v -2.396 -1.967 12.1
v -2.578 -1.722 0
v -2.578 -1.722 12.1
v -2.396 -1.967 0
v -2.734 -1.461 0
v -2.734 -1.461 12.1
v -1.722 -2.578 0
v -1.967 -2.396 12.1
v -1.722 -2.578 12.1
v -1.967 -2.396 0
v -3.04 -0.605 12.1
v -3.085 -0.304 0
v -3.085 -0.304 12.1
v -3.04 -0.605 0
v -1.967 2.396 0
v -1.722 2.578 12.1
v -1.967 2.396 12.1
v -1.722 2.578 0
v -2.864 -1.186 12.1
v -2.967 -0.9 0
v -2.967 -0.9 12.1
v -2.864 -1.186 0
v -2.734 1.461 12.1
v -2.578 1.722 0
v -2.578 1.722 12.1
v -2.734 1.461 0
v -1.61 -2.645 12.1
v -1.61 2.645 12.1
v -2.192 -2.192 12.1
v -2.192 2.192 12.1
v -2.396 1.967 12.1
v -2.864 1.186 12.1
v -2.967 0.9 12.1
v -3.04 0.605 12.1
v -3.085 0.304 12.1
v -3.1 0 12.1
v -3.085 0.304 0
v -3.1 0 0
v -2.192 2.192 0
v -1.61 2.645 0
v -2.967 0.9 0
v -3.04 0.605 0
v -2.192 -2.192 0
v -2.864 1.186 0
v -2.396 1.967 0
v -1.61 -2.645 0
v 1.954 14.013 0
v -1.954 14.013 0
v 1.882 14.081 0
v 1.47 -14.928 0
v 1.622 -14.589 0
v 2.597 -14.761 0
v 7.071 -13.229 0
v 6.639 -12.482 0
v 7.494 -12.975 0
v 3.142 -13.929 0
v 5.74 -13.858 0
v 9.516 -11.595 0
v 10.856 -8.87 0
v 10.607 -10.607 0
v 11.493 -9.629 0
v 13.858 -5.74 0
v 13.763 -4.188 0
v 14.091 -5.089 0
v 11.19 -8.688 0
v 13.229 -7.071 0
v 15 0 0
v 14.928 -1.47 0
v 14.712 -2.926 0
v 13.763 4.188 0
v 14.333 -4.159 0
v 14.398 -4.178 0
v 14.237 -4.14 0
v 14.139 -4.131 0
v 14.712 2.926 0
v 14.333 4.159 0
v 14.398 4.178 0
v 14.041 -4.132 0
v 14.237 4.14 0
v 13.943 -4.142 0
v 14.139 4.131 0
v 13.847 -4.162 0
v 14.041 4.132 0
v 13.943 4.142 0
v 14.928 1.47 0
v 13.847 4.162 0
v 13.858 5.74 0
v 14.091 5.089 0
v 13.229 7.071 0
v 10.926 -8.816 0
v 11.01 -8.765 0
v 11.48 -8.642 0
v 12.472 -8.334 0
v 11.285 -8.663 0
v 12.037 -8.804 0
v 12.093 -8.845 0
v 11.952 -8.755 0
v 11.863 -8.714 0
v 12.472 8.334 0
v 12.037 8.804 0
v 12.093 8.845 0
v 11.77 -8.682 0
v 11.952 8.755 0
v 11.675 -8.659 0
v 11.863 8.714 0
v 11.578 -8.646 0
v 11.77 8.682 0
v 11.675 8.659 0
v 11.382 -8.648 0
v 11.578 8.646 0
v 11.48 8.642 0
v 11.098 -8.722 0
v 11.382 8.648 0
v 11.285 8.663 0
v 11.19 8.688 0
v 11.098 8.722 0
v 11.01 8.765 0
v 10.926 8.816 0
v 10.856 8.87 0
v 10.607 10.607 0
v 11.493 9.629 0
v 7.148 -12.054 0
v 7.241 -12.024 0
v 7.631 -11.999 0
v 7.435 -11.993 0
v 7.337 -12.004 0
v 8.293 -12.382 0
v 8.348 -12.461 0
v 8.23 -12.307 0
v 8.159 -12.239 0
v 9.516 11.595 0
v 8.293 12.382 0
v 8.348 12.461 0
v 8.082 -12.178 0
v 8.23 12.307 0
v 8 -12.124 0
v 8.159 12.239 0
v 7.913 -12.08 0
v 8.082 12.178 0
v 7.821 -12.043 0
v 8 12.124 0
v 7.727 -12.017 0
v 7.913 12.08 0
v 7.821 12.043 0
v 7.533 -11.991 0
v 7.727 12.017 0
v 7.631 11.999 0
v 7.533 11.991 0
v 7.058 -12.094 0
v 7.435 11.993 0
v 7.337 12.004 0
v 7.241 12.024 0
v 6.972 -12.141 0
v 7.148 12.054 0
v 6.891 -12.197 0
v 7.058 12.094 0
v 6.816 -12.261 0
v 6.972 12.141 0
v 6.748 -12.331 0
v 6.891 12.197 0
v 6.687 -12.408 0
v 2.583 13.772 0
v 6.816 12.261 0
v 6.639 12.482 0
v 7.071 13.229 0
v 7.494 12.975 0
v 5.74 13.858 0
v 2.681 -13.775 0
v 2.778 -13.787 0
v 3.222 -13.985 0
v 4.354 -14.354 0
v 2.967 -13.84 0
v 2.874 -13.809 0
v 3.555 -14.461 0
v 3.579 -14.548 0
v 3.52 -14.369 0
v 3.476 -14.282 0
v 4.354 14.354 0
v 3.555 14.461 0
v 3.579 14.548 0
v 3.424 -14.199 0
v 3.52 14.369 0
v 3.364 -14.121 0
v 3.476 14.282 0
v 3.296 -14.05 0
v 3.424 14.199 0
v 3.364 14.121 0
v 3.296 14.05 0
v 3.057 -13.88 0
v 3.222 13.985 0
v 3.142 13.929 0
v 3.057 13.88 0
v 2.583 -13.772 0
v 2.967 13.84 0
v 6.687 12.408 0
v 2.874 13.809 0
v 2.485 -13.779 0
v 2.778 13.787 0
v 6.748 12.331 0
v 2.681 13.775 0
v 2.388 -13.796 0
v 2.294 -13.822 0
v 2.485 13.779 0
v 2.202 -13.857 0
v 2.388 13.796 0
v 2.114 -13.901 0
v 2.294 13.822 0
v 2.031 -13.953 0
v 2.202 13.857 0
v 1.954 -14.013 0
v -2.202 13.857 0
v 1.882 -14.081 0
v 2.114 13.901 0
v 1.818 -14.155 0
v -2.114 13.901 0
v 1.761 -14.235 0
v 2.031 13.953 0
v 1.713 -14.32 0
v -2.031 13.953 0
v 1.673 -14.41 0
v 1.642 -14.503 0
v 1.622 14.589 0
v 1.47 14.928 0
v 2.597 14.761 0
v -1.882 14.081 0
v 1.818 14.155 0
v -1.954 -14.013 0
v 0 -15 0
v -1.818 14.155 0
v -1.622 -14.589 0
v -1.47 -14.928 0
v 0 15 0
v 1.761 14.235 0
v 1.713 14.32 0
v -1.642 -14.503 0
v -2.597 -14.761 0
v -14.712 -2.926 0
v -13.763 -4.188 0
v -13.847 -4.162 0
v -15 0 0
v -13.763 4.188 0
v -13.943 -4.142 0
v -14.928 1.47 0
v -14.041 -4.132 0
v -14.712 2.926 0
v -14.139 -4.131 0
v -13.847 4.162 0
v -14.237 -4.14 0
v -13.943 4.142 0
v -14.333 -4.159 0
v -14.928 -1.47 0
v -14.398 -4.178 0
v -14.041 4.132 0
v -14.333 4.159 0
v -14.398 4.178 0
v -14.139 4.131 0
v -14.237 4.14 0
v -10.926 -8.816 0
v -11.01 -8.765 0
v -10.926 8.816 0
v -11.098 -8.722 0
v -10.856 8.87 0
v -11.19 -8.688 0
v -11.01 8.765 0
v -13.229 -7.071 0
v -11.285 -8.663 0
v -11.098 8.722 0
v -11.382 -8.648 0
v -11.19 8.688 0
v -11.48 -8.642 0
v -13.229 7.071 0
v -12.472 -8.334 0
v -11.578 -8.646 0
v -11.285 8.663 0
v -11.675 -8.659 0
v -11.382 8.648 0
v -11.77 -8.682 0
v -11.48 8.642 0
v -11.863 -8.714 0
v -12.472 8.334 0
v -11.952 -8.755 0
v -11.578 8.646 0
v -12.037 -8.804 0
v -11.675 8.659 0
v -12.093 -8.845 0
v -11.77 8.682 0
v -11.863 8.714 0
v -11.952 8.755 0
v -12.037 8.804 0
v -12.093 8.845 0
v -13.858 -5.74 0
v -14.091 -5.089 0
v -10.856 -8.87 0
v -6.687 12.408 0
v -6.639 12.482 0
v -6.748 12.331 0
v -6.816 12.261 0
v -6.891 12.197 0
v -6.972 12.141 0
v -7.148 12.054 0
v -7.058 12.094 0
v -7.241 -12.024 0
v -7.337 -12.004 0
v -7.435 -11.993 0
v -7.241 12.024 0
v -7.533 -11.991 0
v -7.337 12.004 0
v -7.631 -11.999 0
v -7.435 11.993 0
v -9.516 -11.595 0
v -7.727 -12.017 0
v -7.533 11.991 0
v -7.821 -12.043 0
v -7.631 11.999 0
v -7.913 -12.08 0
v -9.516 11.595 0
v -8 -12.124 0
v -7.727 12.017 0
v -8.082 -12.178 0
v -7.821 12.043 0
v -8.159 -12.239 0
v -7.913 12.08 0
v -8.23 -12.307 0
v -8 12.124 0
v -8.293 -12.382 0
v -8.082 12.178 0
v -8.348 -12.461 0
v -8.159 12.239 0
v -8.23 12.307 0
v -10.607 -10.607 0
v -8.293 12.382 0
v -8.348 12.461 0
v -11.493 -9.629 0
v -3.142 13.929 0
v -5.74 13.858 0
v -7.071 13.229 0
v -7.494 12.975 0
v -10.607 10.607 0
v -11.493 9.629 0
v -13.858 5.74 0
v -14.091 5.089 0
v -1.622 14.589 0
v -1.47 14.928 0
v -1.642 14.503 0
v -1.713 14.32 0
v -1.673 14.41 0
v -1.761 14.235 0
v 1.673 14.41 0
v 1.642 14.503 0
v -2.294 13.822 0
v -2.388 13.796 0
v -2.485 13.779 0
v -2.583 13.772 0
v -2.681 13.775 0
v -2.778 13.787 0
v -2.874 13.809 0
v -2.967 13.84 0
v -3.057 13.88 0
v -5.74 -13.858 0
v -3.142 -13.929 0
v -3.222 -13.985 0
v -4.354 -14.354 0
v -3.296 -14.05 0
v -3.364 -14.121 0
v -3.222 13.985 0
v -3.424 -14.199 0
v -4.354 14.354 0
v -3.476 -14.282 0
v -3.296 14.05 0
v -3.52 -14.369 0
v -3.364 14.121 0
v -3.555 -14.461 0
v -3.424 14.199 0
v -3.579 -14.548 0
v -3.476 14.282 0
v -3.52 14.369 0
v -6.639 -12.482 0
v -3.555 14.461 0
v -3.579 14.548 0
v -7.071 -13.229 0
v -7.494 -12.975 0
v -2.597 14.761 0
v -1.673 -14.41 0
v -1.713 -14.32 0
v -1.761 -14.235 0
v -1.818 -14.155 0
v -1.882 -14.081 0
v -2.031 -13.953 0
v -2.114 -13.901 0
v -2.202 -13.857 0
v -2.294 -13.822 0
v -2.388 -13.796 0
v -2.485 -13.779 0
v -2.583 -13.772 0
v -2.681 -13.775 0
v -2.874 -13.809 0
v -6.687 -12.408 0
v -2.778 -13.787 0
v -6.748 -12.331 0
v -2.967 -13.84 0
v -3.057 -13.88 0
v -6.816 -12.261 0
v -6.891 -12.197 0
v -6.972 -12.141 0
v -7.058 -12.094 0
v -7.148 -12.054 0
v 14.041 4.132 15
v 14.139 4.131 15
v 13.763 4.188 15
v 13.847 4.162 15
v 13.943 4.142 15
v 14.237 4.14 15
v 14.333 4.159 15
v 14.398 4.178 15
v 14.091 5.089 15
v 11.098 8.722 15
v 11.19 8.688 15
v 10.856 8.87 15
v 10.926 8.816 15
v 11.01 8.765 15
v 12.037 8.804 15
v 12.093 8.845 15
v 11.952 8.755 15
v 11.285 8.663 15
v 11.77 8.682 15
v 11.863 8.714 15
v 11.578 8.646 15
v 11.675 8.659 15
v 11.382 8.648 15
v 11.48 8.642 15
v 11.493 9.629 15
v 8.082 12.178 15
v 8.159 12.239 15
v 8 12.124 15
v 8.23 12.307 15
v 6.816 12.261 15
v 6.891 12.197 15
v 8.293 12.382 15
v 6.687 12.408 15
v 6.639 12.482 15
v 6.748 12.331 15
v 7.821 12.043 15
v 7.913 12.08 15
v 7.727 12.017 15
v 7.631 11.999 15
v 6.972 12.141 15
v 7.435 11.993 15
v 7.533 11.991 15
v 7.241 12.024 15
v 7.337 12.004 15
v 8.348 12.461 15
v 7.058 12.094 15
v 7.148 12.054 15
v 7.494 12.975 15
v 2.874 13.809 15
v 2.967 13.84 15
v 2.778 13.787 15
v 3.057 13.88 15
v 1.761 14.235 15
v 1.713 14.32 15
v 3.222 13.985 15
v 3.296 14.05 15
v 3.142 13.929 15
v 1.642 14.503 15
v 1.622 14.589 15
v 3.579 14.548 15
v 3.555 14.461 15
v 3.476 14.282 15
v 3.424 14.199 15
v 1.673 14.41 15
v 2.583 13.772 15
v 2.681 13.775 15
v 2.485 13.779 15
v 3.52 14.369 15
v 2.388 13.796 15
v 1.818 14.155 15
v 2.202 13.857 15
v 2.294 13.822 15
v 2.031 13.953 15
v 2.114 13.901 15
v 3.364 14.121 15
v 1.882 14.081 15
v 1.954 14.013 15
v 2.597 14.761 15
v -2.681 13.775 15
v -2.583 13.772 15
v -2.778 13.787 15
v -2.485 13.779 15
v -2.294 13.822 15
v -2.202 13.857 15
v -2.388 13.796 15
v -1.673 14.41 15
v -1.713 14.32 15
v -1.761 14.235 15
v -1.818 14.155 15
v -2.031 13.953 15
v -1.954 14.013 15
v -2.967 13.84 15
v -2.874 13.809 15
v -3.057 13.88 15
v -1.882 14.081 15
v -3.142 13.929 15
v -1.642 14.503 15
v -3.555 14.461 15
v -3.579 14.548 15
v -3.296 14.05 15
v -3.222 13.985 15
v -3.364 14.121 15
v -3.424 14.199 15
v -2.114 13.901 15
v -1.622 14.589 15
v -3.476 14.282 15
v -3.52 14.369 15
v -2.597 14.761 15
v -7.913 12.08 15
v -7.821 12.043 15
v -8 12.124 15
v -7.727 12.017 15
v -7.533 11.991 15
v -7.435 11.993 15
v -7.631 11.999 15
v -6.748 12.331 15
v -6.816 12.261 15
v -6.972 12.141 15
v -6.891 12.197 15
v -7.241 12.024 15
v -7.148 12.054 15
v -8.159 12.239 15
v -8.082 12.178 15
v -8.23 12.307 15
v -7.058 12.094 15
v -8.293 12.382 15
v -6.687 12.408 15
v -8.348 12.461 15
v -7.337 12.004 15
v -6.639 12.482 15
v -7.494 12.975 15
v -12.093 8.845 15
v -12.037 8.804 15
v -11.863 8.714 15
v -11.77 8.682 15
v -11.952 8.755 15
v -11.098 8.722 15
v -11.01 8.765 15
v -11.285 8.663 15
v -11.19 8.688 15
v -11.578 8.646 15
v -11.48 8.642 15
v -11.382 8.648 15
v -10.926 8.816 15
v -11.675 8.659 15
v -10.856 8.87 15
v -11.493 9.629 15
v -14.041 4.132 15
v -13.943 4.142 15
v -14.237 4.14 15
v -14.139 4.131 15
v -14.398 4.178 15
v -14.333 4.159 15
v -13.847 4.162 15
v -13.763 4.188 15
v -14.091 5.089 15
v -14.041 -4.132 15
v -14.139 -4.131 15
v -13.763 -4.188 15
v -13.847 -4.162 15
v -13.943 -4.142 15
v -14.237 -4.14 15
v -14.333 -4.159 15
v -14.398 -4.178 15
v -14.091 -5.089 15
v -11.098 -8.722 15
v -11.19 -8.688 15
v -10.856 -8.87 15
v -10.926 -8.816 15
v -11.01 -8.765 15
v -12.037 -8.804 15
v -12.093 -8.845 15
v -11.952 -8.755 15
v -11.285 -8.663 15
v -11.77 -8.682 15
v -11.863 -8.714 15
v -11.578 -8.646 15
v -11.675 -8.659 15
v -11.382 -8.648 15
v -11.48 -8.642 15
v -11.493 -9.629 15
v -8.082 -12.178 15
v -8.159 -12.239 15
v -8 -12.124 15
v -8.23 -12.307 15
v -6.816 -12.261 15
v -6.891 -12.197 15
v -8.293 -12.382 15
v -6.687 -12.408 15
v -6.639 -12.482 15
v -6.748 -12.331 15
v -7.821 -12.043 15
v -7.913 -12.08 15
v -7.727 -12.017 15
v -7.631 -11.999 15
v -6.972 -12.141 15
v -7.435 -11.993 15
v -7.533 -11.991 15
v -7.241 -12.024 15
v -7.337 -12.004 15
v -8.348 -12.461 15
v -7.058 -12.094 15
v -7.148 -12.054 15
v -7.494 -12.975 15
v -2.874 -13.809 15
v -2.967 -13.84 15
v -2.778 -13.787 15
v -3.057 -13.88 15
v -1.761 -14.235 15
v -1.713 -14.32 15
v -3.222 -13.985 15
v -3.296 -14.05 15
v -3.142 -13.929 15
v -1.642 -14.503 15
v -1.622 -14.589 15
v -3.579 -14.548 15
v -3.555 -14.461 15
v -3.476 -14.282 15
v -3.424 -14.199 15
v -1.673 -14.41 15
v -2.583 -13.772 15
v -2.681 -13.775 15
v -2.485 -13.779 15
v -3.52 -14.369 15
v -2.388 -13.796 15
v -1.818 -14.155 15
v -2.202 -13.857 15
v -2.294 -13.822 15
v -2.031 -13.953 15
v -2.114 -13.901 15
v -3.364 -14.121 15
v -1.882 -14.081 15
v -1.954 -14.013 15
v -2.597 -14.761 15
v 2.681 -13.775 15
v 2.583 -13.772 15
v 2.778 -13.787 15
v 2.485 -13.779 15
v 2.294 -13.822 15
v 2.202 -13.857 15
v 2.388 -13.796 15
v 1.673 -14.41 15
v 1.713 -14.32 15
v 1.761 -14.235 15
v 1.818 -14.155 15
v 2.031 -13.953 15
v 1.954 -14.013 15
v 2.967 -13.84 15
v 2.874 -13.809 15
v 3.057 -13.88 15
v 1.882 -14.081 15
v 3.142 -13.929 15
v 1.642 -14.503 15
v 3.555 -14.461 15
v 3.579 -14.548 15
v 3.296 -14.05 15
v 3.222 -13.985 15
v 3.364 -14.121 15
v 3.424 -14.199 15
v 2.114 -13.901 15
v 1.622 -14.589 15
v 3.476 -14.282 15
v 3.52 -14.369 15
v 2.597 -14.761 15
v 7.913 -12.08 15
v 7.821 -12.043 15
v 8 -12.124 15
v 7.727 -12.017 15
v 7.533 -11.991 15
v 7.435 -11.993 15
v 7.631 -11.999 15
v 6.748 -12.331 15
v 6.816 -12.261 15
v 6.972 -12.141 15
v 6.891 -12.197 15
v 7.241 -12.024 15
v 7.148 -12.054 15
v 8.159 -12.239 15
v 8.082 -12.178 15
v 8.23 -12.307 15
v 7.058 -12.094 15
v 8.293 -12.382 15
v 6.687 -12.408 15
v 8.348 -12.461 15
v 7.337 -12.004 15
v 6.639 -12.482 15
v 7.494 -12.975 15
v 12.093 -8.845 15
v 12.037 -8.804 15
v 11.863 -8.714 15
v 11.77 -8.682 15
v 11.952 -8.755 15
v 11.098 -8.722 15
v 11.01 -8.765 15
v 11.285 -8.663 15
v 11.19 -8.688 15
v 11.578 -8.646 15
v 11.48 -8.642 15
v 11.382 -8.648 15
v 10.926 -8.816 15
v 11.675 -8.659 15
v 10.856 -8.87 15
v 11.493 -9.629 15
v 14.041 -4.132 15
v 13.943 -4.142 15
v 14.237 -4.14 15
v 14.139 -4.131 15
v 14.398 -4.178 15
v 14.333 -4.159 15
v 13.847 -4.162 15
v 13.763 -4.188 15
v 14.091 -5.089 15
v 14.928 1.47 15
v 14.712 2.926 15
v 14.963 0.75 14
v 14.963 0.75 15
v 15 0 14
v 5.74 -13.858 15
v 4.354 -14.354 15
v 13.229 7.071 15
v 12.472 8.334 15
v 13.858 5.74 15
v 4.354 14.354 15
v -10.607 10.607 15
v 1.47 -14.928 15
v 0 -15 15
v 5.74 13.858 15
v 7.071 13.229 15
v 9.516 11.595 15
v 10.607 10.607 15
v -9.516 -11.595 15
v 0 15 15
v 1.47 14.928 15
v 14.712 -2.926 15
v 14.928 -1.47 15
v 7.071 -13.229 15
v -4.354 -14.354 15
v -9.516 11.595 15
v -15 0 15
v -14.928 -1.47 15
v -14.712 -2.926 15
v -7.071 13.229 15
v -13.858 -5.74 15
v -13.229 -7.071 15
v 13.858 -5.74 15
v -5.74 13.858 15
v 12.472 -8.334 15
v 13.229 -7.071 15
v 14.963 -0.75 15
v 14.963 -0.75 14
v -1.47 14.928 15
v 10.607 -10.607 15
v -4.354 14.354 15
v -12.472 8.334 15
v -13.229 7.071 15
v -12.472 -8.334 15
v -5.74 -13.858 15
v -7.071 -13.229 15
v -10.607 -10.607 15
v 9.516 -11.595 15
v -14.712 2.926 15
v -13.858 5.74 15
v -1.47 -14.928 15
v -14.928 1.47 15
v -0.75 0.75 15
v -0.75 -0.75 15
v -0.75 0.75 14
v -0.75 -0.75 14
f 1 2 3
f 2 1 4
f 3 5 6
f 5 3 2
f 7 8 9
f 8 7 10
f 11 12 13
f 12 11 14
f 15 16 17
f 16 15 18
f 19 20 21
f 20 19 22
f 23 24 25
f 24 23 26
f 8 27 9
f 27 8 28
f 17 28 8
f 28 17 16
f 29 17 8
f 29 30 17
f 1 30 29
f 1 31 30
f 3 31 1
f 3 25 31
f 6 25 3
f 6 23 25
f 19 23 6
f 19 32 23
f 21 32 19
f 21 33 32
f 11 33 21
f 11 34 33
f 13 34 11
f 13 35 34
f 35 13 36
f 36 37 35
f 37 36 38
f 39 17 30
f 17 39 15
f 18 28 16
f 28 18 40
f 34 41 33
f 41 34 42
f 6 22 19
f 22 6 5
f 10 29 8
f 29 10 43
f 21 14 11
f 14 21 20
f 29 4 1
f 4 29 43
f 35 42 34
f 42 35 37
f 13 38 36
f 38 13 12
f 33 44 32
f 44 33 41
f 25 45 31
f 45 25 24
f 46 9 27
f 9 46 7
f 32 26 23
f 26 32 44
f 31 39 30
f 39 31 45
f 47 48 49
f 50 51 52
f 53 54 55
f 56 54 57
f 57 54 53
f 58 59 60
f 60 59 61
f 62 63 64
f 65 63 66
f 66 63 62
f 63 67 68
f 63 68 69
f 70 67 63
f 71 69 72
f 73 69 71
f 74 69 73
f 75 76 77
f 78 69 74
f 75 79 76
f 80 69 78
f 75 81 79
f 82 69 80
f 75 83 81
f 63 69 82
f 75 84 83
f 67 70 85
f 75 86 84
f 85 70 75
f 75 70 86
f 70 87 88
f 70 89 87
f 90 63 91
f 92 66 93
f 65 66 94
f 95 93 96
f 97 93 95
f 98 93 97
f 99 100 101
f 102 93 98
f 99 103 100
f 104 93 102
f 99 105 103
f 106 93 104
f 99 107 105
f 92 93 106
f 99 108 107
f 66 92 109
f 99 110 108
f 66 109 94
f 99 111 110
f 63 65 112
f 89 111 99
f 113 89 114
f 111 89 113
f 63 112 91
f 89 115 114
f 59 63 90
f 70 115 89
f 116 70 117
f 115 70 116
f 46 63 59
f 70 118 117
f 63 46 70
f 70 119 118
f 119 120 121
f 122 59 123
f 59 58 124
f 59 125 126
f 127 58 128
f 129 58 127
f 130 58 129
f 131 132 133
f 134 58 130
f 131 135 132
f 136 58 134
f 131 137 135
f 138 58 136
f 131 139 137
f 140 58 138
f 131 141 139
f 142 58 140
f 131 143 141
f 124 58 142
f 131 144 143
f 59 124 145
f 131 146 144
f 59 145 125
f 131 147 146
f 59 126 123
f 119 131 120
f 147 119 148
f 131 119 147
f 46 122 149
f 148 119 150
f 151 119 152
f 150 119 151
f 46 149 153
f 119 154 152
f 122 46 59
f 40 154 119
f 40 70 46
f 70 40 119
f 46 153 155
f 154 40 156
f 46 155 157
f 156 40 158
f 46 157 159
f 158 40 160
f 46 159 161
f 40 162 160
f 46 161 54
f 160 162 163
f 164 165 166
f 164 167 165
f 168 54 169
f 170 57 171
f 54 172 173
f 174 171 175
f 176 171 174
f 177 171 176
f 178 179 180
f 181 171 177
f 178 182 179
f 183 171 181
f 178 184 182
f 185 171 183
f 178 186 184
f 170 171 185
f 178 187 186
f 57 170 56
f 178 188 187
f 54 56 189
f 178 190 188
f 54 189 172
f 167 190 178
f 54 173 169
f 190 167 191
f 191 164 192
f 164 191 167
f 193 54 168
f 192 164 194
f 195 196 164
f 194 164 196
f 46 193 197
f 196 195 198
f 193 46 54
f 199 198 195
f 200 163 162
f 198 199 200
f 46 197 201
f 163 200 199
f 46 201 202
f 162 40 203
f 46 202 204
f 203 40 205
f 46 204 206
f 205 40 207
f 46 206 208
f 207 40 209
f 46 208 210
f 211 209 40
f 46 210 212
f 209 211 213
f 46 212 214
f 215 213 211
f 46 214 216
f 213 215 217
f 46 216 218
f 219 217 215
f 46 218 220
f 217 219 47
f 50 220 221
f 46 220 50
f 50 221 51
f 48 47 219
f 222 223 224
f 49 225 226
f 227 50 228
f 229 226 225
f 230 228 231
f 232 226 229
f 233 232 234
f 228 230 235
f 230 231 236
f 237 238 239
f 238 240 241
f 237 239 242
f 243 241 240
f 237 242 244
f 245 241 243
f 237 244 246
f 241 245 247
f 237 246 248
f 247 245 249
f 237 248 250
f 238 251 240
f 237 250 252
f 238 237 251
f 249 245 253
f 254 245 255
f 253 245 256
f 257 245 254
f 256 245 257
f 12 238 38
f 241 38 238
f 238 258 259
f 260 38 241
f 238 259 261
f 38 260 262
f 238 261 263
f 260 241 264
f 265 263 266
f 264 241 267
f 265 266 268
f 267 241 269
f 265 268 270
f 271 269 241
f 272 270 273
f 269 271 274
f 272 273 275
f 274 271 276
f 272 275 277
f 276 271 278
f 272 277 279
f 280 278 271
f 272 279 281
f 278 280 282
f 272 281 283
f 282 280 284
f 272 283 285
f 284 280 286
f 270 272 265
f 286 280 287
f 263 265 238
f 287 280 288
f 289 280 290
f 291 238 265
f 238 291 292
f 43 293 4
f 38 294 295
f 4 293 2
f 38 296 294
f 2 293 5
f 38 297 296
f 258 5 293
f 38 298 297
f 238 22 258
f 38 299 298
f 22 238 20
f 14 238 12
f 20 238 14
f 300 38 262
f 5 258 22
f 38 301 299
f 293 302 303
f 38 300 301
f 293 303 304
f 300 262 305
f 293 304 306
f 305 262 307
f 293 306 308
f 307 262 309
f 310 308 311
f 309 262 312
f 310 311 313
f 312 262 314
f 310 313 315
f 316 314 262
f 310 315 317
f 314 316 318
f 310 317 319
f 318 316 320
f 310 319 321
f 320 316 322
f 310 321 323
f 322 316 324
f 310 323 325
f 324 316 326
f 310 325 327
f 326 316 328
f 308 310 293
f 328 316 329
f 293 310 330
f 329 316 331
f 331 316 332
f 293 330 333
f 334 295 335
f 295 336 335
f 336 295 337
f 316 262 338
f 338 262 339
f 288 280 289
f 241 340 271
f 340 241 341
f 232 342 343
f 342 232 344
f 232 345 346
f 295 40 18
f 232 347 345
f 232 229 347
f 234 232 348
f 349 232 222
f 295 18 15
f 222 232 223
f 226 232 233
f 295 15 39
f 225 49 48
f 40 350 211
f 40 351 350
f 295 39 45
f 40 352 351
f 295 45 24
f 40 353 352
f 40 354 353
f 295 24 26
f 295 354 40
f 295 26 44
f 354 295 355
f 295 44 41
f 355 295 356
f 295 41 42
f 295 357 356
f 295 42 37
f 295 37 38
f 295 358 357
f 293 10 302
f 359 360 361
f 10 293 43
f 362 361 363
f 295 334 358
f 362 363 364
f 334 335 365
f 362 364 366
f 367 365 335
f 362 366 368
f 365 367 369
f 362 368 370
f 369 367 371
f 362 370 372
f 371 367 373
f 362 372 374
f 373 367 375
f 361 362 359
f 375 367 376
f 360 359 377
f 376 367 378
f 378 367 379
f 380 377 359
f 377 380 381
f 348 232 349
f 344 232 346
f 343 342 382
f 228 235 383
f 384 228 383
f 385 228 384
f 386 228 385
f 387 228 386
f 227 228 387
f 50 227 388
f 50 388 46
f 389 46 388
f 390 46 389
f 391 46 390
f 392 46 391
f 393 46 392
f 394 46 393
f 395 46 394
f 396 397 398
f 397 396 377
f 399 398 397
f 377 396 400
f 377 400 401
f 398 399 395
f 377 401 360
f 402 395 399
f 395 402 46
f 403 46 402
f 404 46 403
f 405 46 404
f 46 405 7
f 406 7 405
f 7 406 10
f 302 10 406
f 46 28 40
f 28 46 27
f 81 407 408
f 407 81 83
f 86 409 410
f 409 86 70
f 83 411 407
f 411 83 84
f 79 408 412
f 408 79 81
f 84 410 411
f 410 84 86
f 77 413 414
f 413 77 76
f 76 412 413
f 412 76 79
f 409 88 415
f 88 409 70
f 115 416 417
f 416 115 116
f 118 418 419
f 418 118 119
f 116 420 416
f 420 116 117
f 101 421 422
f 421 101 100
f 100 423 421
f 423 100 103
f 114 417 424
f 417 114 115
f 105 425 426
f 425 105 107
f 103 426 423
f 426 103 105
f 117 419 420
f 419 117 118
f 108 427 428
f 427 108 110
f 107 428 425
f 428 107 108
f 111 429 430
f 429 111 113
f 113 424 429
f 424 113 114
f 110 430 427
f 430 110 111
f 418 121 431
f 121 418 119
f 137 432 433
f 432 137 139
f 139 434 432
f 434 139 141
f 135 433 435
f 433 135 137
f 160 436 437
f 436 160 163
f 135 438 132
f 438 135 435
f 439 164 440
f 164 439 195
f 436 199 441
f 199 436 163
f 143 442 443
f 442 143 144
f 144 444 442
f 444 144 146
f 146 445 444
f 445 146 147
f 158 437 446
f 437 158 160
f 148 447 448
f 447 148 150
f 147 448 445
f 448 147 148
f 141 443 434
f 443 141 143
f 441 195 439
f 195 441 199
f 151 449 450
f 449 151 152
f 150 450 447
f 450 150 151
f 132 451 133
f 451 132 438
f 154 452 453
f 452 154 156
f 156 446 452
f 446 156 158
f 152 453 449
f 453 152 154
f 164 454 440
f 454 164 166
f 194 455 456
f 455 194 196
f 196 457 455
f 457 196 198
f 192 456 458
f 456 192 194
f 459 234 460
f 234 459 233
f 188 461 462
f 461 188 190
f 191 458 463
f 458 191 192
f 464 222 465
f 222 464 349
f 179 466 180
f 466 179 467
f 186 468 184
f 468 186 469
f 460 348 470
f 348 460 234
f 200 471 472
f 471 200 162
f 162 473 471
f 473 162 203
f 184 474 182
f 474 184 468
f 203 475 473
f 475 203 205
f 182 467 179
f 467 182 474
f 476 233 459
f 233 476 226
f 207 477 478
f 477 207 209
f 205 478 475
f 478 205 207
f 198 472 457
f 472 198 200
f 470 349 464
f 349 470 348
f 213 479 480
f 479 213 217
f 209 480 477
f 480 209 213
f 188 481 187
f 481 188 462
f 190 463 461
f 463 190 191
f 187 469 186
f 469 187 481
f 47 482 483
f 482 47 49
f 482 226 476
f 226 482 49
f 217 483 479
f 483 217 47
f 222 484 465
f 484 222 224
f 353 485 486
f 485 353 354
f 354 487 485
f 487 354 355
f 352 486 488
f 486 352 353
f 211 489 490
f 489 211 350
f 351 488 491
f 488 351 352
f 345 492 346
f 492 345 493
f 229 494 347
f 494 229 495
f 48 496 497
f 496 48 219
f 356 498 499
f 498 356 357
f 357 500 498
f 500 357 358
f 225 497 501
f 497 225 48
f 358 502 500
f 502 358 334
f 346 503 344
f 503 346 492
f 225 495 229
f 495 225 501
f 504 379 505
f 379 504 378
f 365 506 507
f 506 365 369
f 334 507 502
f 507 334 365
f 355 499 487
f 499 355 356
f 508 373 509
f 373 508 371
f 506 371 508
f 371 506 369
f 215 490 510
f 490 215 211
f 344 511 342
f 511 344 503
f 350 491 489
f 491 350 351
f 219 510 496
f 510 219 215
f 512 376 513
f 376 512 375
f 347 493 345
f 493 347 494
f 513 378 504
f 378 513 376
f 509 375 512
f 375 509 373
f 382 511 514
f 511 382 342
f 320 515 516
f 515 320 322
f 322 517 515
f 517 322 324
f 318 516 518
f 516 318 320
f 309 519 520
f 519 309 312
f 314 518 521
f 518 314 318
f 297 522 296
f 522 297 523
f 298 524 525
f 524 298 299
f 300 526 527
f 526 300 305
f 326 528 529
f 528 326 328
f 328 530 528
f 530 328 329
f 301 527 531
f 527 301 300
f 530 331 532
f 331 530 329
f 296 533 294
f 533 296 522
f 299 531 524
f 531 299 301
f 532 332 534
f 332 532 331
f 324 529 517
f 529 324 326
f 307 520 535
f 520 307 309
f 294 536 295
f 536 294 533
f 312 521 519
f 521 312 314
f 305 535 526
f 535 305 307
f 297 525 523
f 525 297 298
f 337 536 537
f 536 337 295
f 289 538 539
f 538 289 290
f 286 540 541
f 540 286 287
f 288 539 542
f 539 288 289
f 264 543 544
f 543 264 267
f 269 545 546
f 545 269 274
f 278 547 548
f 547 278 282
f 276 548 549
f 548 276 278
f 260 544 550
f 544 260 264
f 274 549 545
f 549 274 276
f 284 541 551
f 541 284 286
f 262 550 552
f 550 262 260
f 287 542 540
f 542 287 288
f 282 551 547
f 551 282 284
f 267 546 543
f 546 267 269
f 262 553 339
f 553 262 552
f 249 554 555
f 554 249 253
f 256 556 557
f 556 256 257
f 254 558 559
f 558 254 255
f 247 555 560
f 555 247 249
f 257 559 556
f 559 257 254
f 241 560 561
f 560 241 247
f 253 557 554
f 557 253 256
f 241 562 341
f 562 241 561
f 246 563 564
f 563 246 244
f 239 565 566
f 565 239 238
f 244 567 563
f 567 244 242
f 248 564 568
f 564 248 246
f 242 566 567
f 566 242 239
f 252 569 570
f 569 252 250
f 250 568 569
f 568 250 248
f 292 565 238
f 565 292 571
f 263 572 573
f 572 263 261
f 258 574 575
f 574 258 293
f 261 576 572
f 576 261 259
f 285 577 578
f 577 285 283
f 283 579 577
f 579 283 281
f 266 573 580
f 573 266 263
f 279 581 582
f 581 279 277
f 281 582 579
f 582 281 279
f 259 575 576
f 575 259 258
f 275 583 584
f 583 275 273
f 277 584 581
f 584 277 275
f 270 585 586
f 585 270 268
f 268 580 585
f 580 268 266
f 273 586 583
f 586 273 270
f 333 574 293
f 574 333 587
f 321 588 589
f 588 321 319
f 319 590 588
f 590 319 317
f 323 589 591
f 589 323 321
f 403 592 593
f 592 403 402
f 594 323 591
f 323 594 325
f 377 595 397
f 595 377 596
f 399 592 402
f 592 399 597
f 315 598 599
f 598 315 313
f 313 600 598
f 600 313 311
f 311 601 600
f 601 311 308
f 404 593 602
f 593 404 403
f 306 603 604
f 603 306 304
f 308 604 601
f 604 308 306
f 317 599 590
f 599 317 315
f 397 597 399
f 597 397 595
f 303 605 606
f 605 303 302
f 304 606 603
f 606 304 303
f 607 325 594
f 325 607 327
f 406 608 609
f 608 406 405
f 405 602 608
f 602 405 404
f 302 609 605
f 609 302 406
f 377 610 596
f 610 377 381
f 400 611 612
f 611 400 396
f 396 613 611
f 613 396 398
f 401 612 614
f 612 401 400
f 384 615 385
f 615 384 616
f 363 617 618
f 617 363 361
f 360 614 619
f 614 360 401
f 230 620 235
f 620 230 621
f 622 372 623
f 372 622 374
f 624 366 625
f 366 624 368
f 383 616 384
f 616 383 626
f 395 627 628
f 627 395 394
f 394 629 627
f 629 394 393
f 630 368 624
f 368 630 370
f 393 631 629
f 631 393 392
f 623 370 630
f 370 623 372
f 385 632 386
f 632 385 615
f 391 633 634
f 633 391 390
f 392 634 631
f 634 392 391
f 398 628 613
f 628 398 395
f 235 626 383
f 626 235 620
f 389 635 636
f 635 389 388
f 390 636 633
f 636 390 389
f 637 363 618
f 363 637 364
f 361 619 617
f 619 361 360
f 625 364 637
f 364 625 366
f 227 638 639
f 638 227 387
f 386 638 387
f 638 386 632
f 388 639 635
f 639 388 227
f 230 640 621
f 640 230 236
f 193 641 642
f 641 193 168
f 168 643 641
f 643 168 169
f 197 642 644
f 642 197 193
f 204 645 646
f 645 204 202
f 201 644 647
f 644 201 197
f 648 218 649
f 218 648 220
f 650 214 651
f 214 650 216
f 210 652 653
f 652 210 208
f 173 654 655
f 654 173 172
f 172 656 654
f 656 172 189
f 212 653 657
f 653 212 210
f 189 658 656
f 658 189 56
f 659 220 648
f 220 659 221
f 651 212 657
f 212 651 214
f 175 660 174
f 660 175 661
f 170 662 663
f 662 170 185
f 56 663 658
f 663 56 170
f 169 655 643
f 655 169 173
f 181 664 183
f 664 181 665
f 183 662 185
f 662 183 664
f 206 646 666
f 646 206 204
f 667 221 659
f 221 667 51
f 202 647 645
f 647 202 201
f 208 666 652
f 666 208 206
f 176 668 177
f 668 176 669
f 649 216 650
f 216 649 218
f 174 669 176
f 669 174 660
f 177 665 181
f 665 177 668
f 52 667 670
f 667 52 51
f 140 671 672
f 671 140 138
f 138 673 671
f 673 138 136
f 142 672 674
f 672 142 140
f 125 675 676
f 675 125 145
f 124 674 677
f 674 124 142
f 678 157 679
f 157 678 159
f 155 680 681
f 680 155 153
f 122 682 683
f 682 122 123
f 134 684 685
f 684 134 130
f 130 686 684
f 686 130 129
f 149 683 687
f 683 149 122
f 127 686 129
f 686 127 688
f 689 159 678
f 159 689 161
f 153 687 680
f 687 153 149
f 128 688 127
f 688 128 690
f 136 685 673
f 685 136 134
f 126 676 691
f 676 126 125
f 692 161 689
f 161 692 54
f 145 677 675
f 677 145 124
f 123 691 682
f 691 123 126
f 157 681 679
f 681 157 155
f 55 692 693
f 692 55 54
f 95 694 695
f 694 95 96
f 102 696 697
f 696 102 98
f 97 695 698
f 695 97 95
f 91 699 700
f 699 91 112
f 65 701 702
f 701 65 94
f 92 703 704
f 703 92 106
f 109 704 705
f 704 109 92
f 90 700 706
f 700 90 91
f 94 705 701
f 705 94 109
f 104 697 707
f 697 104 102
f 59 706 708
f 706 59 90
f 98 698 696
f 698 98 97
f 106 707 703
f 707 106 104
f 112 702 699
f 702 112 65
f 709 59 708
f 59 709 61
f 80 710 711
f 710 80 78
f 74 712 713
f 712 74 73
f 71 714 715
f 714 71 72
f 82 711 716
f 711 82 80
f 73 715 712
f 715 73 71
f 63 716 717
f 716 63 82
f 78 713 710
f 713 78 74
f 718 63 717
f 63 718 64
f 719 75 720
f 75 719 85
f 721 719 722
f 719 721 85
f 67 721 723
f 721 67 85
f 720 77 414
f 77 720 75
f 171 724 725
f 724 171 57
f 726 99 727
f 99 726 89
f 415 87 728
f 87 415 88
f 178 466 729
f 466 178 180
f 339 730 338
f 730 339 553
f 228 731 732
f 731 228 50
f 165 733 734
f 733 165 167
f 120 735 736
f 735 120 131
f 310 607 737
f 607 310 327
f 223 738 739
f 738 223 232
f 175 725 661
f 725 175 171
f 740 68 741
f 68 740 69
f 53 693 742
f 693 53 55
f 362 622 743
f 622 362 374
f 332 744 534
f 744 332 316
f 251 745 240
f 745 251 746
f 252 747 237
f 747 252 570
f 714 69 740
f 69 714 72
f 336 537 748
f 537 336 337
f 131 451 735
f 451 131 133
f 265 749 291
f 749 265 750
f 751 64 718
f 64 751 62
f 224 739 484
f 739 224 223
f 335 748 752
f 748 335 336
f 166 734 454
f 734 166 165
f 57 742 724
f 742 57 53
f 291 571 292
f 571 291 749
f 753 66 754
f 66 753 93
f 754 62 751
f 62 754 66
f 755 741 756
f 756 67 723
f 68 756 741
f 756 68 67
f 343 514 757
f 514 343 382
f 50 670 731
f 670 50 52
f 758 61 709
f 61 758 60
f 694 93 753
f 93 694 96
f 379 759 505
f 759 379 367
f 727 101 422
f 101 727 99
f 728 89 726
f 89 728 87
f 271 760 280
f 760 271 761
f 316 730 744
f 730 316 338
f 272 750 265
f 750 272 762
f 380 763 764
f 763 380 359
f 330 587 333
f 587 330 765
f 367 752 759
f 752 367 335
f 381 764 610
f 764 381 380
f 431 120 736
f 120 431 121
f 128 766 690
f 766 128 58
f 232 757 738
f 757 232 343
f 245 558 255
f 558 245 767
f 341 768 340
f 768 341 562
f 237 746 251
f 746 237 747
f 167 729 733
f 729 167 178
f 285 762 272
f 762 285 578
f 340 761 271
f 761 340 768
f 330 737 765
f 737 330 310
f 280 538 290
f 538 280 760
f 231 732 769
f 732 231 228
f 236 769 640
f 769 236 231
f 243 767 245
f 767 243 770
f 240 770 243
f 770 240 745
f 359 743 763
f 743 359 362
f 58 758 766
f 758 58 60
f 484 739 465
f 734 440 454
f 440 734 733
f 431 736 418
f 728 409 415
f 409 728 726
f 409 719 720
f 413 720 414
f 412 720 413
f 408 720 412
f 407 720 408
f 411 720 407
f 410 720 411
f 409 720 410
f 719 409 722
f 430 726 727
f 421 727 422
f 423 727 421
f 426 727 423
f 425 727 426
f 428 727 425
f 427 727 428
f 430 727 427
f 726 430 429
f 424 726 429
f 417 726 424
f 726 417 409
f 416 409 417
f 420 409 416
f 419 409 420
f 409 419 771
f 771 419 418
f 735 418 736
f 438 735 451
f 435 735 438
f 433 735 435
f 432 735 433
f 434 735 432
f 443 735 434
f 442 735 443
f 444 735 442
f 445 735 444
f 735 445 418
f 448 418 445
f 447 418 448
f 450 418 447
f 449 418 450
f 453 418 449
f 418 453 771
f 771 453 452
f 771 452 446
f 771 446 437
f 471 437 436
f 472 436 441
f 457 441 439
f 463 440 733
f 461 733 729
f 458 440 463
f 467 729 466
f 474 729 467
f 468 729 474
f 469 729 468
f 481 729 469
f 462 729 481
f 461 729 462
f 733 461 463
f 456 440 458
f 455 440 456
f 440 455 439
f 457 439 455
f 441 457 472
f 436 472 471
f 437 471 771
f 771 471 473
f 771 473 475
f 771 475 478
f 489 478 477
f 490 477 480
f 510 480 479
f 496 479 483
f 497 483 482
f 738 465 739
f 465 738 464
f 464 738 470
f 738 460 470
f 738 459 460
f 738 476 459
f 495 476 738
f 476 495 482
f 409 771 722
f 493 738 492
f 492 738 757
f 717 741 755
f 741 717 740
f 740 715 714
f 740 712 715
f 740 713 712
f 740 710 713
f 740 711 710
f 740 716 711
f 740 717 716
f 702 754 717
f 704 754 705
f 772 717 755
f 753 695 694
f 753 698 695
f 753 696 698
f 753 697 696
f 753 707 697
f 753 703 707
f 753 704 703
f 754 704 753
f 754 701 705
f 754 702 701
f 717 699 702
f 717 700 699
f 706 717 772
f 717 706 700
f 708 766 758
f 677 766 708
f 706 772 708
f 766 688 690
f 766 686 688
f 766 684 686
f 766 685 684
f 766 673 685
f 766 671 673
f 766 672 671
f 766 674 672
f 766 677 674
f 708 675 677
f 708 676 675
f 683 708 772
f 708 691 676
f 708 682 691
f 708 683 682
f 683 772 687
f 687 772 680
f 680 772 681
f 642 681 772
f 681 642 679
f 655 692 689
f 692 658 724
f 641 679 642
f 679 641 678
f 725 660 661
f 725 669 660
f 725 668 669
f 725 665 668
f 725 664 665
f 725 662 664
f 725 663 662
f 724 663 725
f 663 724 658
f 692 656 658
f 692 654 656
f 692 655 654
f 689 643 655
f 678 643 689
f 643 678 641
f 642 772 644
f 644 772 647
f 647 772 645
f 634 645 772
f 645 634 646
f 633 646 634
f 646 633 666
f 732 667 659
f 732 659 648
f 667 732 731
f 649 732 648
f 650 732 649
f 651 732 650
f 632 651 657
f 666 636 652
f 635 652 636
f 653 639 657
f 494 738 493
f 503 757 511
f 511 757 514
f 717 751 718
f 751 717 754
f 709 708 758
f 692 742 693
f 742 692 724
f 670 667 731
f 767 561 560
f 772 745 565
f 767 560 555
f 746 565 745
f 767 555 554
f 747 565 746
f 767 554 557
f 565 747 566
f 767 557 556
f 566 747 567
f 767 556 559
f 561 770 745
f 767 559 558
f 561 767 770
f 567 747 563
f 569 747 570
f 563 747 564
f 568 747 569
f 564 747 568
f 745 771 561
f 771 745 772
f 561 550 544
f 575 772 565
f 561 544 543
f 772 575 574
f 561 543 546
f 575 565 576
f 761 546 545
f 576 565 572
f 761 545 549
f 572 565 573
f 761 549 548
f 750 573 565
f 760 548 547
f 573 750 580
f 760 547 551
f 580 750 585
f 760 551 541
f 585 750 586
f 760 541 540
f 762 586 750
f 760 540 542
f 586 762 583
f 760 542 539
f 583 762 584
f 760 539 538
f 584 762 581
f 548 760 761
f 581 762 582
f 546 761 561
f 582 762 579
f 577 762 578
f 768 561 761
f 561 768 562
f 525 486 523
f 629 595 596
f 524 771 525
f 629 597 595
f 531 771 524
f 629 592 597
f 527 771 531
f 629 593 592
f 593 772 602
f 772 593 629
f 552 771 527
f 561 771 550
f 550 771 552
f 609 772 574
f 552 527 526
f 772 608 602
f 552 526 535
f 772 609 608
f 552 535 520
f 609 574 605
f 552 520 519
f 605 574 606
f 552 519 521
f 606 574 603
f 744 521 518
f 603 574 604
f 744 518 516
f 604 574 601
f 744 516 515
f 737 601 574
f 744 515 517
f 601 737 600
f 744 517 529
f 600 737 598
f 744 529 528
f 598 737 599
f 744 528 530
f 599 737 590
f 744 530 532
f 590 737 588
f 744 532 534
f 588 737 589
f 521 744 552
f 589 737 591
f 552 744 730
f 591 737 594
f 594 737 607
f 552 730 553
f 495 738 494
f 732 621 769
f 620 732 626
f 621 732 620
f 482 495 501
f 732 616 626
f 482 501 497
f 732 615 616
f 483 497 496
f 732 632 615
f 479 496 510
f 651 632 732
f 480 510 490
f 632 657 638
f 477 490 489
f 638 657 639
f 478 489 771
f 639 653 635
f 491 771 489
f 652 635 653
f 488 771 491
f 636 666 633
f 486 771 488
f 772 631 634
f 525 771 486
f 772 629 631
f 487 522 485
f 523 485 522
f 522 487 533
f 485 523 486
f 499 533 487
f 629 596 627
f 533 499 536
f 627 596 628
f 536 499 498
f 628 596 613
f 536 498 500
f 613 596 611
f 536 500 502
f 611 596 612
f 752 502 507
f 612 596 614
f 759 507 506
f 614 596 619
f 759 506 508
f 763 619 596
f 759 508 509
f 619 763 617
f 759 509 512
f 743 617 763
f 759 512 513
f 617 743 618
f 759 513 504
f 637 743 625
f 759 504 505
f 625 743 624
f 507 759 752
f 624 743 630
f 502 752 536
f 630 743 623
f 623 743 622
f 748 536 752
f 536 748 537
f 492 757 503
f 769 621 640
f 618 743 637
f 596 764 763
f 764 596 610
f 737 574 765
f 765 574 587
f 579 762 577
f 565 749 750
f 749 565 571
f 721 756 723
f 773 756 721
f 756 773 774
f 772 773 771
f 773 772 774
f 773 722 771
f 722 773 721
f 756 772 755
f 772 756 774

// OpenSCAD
// Replacement knob for hotplate stirrer with 6 mm D-shaft
// Dimensions measured with calipers

// Knob body dimensions
knob_diameter = 30;
knob_radius = knob_diameter / 2;
knob_height = 15;

// D-shaft blind bore dimensions
bore_diameter = 6.2;
bore_radius = bore_diameter / 2;
bore_depth = 12;
// Distance from flat to opposite side of circle is 4.7 mm
// This means the flat is offset from center by: bore_radius - 4.7 = 3.1 - 4.7 = -1.6 mm
// So the flat is 1.6 mm on the opposite side of center from the "point" of the D
d_flat_offset = bore_radius - 4.7; // = -1.6 mm

// Grip groove dimensions
num_grooves = 18;
groove_diameter = 2;
groove_radius = groove_diameter / 2;

// Pointer groove dimensions
pointer_width = 1.5;
pointer_depth = 1;

// Print quality
$fn = 64;

// Main knob body
difference() {
    // Solid cylinder
    cylinder(h = knob_height, r = knob_radius, center = false);
    
    // D-shaped blind bore (centered on Z axis, extending from z=0 up to bore_depth)
    // The D-shape: a circle with one side cut flat
    // The flat is at distance d_flat_offset from center (negative means flat is on the -X side)
    // We create the D-shape by subtracting a half-space from a cylinder
    translate([0, 0, 0]) {
        difference() {
            // Cylindrical bore
            cylinder(h = bore_depth + 0.1, r = bore_radius, center = false);
            
            // Cut the flat side: remove material where x < d_flat_offset
            // This creates a flat surface at x = d_flat_offset
            // We use a large box that extends past the bore
            translate([d_flat_offset - 0.01, -knob_radius - 1, -0.1]) {
                cube([knob_radius + 1, 2 * knob_radius + 2, bore_depth + 0.3]);
            }
        }
    }
    
    // 18 evenly spaced vertical grip grooves along the outer surface
    for (i = [0 : num_grooves - 1]) {
        angle = i * 360 / num_grooves;
        // Position the groove center on the outer surface
        translate([knob_radius * cos(angle), knob_radius * sin(angle), 0]) {
            // Rotate so the half-cylinder faces inward
            rotate([0, 0, -angle]) {
                // Half-cylinder groove: cut into the knob from the outside
                // The groove is a half-cylinder of diameter 2 mm, centered on the surface
                // So it extends groove_radius inward and groove_radius outward (but outward is outside the knob)
                translate([0, 0, 0]) {
                    difference() {
                        cylinder(h = knob_height + 0.1, r = groove_radius, center = false);
                        // Remove the outer half (outside the knob) - not strictly necessary but clean
                        translate([-groove_radius - 0.01, -groove_radius - 0.01, -0.1]) {
                            cube([groove_radius + 0.02, 2 * groove_radius + 0.02, knob_height + 0.3]);
                        }
                    }
                }
            }
        }
    }
    
    // Pointer groove on top face: 1.5 mm wide, 1 mm deep, from center to outer edge
    // On the same side as the flat of the D (the flat is at x = d_flat_offset = -1.6 mm, so negative X side)
    // The groove runs from center (0,0) to outer edge in the -X direction
    // The groove is a rectangular slot, 1.5 mm wide (Y dimension) and extending from X=0 to X=-knob_radius
    // Centered on Y=0
    translate([-pointer_width/2, -pointer_width/2, knob_height - pointer_depth]) {
        cube([knob_radius + pointer_width/2, pointer_width, pointer_depth + 0.1]);
    }
}
